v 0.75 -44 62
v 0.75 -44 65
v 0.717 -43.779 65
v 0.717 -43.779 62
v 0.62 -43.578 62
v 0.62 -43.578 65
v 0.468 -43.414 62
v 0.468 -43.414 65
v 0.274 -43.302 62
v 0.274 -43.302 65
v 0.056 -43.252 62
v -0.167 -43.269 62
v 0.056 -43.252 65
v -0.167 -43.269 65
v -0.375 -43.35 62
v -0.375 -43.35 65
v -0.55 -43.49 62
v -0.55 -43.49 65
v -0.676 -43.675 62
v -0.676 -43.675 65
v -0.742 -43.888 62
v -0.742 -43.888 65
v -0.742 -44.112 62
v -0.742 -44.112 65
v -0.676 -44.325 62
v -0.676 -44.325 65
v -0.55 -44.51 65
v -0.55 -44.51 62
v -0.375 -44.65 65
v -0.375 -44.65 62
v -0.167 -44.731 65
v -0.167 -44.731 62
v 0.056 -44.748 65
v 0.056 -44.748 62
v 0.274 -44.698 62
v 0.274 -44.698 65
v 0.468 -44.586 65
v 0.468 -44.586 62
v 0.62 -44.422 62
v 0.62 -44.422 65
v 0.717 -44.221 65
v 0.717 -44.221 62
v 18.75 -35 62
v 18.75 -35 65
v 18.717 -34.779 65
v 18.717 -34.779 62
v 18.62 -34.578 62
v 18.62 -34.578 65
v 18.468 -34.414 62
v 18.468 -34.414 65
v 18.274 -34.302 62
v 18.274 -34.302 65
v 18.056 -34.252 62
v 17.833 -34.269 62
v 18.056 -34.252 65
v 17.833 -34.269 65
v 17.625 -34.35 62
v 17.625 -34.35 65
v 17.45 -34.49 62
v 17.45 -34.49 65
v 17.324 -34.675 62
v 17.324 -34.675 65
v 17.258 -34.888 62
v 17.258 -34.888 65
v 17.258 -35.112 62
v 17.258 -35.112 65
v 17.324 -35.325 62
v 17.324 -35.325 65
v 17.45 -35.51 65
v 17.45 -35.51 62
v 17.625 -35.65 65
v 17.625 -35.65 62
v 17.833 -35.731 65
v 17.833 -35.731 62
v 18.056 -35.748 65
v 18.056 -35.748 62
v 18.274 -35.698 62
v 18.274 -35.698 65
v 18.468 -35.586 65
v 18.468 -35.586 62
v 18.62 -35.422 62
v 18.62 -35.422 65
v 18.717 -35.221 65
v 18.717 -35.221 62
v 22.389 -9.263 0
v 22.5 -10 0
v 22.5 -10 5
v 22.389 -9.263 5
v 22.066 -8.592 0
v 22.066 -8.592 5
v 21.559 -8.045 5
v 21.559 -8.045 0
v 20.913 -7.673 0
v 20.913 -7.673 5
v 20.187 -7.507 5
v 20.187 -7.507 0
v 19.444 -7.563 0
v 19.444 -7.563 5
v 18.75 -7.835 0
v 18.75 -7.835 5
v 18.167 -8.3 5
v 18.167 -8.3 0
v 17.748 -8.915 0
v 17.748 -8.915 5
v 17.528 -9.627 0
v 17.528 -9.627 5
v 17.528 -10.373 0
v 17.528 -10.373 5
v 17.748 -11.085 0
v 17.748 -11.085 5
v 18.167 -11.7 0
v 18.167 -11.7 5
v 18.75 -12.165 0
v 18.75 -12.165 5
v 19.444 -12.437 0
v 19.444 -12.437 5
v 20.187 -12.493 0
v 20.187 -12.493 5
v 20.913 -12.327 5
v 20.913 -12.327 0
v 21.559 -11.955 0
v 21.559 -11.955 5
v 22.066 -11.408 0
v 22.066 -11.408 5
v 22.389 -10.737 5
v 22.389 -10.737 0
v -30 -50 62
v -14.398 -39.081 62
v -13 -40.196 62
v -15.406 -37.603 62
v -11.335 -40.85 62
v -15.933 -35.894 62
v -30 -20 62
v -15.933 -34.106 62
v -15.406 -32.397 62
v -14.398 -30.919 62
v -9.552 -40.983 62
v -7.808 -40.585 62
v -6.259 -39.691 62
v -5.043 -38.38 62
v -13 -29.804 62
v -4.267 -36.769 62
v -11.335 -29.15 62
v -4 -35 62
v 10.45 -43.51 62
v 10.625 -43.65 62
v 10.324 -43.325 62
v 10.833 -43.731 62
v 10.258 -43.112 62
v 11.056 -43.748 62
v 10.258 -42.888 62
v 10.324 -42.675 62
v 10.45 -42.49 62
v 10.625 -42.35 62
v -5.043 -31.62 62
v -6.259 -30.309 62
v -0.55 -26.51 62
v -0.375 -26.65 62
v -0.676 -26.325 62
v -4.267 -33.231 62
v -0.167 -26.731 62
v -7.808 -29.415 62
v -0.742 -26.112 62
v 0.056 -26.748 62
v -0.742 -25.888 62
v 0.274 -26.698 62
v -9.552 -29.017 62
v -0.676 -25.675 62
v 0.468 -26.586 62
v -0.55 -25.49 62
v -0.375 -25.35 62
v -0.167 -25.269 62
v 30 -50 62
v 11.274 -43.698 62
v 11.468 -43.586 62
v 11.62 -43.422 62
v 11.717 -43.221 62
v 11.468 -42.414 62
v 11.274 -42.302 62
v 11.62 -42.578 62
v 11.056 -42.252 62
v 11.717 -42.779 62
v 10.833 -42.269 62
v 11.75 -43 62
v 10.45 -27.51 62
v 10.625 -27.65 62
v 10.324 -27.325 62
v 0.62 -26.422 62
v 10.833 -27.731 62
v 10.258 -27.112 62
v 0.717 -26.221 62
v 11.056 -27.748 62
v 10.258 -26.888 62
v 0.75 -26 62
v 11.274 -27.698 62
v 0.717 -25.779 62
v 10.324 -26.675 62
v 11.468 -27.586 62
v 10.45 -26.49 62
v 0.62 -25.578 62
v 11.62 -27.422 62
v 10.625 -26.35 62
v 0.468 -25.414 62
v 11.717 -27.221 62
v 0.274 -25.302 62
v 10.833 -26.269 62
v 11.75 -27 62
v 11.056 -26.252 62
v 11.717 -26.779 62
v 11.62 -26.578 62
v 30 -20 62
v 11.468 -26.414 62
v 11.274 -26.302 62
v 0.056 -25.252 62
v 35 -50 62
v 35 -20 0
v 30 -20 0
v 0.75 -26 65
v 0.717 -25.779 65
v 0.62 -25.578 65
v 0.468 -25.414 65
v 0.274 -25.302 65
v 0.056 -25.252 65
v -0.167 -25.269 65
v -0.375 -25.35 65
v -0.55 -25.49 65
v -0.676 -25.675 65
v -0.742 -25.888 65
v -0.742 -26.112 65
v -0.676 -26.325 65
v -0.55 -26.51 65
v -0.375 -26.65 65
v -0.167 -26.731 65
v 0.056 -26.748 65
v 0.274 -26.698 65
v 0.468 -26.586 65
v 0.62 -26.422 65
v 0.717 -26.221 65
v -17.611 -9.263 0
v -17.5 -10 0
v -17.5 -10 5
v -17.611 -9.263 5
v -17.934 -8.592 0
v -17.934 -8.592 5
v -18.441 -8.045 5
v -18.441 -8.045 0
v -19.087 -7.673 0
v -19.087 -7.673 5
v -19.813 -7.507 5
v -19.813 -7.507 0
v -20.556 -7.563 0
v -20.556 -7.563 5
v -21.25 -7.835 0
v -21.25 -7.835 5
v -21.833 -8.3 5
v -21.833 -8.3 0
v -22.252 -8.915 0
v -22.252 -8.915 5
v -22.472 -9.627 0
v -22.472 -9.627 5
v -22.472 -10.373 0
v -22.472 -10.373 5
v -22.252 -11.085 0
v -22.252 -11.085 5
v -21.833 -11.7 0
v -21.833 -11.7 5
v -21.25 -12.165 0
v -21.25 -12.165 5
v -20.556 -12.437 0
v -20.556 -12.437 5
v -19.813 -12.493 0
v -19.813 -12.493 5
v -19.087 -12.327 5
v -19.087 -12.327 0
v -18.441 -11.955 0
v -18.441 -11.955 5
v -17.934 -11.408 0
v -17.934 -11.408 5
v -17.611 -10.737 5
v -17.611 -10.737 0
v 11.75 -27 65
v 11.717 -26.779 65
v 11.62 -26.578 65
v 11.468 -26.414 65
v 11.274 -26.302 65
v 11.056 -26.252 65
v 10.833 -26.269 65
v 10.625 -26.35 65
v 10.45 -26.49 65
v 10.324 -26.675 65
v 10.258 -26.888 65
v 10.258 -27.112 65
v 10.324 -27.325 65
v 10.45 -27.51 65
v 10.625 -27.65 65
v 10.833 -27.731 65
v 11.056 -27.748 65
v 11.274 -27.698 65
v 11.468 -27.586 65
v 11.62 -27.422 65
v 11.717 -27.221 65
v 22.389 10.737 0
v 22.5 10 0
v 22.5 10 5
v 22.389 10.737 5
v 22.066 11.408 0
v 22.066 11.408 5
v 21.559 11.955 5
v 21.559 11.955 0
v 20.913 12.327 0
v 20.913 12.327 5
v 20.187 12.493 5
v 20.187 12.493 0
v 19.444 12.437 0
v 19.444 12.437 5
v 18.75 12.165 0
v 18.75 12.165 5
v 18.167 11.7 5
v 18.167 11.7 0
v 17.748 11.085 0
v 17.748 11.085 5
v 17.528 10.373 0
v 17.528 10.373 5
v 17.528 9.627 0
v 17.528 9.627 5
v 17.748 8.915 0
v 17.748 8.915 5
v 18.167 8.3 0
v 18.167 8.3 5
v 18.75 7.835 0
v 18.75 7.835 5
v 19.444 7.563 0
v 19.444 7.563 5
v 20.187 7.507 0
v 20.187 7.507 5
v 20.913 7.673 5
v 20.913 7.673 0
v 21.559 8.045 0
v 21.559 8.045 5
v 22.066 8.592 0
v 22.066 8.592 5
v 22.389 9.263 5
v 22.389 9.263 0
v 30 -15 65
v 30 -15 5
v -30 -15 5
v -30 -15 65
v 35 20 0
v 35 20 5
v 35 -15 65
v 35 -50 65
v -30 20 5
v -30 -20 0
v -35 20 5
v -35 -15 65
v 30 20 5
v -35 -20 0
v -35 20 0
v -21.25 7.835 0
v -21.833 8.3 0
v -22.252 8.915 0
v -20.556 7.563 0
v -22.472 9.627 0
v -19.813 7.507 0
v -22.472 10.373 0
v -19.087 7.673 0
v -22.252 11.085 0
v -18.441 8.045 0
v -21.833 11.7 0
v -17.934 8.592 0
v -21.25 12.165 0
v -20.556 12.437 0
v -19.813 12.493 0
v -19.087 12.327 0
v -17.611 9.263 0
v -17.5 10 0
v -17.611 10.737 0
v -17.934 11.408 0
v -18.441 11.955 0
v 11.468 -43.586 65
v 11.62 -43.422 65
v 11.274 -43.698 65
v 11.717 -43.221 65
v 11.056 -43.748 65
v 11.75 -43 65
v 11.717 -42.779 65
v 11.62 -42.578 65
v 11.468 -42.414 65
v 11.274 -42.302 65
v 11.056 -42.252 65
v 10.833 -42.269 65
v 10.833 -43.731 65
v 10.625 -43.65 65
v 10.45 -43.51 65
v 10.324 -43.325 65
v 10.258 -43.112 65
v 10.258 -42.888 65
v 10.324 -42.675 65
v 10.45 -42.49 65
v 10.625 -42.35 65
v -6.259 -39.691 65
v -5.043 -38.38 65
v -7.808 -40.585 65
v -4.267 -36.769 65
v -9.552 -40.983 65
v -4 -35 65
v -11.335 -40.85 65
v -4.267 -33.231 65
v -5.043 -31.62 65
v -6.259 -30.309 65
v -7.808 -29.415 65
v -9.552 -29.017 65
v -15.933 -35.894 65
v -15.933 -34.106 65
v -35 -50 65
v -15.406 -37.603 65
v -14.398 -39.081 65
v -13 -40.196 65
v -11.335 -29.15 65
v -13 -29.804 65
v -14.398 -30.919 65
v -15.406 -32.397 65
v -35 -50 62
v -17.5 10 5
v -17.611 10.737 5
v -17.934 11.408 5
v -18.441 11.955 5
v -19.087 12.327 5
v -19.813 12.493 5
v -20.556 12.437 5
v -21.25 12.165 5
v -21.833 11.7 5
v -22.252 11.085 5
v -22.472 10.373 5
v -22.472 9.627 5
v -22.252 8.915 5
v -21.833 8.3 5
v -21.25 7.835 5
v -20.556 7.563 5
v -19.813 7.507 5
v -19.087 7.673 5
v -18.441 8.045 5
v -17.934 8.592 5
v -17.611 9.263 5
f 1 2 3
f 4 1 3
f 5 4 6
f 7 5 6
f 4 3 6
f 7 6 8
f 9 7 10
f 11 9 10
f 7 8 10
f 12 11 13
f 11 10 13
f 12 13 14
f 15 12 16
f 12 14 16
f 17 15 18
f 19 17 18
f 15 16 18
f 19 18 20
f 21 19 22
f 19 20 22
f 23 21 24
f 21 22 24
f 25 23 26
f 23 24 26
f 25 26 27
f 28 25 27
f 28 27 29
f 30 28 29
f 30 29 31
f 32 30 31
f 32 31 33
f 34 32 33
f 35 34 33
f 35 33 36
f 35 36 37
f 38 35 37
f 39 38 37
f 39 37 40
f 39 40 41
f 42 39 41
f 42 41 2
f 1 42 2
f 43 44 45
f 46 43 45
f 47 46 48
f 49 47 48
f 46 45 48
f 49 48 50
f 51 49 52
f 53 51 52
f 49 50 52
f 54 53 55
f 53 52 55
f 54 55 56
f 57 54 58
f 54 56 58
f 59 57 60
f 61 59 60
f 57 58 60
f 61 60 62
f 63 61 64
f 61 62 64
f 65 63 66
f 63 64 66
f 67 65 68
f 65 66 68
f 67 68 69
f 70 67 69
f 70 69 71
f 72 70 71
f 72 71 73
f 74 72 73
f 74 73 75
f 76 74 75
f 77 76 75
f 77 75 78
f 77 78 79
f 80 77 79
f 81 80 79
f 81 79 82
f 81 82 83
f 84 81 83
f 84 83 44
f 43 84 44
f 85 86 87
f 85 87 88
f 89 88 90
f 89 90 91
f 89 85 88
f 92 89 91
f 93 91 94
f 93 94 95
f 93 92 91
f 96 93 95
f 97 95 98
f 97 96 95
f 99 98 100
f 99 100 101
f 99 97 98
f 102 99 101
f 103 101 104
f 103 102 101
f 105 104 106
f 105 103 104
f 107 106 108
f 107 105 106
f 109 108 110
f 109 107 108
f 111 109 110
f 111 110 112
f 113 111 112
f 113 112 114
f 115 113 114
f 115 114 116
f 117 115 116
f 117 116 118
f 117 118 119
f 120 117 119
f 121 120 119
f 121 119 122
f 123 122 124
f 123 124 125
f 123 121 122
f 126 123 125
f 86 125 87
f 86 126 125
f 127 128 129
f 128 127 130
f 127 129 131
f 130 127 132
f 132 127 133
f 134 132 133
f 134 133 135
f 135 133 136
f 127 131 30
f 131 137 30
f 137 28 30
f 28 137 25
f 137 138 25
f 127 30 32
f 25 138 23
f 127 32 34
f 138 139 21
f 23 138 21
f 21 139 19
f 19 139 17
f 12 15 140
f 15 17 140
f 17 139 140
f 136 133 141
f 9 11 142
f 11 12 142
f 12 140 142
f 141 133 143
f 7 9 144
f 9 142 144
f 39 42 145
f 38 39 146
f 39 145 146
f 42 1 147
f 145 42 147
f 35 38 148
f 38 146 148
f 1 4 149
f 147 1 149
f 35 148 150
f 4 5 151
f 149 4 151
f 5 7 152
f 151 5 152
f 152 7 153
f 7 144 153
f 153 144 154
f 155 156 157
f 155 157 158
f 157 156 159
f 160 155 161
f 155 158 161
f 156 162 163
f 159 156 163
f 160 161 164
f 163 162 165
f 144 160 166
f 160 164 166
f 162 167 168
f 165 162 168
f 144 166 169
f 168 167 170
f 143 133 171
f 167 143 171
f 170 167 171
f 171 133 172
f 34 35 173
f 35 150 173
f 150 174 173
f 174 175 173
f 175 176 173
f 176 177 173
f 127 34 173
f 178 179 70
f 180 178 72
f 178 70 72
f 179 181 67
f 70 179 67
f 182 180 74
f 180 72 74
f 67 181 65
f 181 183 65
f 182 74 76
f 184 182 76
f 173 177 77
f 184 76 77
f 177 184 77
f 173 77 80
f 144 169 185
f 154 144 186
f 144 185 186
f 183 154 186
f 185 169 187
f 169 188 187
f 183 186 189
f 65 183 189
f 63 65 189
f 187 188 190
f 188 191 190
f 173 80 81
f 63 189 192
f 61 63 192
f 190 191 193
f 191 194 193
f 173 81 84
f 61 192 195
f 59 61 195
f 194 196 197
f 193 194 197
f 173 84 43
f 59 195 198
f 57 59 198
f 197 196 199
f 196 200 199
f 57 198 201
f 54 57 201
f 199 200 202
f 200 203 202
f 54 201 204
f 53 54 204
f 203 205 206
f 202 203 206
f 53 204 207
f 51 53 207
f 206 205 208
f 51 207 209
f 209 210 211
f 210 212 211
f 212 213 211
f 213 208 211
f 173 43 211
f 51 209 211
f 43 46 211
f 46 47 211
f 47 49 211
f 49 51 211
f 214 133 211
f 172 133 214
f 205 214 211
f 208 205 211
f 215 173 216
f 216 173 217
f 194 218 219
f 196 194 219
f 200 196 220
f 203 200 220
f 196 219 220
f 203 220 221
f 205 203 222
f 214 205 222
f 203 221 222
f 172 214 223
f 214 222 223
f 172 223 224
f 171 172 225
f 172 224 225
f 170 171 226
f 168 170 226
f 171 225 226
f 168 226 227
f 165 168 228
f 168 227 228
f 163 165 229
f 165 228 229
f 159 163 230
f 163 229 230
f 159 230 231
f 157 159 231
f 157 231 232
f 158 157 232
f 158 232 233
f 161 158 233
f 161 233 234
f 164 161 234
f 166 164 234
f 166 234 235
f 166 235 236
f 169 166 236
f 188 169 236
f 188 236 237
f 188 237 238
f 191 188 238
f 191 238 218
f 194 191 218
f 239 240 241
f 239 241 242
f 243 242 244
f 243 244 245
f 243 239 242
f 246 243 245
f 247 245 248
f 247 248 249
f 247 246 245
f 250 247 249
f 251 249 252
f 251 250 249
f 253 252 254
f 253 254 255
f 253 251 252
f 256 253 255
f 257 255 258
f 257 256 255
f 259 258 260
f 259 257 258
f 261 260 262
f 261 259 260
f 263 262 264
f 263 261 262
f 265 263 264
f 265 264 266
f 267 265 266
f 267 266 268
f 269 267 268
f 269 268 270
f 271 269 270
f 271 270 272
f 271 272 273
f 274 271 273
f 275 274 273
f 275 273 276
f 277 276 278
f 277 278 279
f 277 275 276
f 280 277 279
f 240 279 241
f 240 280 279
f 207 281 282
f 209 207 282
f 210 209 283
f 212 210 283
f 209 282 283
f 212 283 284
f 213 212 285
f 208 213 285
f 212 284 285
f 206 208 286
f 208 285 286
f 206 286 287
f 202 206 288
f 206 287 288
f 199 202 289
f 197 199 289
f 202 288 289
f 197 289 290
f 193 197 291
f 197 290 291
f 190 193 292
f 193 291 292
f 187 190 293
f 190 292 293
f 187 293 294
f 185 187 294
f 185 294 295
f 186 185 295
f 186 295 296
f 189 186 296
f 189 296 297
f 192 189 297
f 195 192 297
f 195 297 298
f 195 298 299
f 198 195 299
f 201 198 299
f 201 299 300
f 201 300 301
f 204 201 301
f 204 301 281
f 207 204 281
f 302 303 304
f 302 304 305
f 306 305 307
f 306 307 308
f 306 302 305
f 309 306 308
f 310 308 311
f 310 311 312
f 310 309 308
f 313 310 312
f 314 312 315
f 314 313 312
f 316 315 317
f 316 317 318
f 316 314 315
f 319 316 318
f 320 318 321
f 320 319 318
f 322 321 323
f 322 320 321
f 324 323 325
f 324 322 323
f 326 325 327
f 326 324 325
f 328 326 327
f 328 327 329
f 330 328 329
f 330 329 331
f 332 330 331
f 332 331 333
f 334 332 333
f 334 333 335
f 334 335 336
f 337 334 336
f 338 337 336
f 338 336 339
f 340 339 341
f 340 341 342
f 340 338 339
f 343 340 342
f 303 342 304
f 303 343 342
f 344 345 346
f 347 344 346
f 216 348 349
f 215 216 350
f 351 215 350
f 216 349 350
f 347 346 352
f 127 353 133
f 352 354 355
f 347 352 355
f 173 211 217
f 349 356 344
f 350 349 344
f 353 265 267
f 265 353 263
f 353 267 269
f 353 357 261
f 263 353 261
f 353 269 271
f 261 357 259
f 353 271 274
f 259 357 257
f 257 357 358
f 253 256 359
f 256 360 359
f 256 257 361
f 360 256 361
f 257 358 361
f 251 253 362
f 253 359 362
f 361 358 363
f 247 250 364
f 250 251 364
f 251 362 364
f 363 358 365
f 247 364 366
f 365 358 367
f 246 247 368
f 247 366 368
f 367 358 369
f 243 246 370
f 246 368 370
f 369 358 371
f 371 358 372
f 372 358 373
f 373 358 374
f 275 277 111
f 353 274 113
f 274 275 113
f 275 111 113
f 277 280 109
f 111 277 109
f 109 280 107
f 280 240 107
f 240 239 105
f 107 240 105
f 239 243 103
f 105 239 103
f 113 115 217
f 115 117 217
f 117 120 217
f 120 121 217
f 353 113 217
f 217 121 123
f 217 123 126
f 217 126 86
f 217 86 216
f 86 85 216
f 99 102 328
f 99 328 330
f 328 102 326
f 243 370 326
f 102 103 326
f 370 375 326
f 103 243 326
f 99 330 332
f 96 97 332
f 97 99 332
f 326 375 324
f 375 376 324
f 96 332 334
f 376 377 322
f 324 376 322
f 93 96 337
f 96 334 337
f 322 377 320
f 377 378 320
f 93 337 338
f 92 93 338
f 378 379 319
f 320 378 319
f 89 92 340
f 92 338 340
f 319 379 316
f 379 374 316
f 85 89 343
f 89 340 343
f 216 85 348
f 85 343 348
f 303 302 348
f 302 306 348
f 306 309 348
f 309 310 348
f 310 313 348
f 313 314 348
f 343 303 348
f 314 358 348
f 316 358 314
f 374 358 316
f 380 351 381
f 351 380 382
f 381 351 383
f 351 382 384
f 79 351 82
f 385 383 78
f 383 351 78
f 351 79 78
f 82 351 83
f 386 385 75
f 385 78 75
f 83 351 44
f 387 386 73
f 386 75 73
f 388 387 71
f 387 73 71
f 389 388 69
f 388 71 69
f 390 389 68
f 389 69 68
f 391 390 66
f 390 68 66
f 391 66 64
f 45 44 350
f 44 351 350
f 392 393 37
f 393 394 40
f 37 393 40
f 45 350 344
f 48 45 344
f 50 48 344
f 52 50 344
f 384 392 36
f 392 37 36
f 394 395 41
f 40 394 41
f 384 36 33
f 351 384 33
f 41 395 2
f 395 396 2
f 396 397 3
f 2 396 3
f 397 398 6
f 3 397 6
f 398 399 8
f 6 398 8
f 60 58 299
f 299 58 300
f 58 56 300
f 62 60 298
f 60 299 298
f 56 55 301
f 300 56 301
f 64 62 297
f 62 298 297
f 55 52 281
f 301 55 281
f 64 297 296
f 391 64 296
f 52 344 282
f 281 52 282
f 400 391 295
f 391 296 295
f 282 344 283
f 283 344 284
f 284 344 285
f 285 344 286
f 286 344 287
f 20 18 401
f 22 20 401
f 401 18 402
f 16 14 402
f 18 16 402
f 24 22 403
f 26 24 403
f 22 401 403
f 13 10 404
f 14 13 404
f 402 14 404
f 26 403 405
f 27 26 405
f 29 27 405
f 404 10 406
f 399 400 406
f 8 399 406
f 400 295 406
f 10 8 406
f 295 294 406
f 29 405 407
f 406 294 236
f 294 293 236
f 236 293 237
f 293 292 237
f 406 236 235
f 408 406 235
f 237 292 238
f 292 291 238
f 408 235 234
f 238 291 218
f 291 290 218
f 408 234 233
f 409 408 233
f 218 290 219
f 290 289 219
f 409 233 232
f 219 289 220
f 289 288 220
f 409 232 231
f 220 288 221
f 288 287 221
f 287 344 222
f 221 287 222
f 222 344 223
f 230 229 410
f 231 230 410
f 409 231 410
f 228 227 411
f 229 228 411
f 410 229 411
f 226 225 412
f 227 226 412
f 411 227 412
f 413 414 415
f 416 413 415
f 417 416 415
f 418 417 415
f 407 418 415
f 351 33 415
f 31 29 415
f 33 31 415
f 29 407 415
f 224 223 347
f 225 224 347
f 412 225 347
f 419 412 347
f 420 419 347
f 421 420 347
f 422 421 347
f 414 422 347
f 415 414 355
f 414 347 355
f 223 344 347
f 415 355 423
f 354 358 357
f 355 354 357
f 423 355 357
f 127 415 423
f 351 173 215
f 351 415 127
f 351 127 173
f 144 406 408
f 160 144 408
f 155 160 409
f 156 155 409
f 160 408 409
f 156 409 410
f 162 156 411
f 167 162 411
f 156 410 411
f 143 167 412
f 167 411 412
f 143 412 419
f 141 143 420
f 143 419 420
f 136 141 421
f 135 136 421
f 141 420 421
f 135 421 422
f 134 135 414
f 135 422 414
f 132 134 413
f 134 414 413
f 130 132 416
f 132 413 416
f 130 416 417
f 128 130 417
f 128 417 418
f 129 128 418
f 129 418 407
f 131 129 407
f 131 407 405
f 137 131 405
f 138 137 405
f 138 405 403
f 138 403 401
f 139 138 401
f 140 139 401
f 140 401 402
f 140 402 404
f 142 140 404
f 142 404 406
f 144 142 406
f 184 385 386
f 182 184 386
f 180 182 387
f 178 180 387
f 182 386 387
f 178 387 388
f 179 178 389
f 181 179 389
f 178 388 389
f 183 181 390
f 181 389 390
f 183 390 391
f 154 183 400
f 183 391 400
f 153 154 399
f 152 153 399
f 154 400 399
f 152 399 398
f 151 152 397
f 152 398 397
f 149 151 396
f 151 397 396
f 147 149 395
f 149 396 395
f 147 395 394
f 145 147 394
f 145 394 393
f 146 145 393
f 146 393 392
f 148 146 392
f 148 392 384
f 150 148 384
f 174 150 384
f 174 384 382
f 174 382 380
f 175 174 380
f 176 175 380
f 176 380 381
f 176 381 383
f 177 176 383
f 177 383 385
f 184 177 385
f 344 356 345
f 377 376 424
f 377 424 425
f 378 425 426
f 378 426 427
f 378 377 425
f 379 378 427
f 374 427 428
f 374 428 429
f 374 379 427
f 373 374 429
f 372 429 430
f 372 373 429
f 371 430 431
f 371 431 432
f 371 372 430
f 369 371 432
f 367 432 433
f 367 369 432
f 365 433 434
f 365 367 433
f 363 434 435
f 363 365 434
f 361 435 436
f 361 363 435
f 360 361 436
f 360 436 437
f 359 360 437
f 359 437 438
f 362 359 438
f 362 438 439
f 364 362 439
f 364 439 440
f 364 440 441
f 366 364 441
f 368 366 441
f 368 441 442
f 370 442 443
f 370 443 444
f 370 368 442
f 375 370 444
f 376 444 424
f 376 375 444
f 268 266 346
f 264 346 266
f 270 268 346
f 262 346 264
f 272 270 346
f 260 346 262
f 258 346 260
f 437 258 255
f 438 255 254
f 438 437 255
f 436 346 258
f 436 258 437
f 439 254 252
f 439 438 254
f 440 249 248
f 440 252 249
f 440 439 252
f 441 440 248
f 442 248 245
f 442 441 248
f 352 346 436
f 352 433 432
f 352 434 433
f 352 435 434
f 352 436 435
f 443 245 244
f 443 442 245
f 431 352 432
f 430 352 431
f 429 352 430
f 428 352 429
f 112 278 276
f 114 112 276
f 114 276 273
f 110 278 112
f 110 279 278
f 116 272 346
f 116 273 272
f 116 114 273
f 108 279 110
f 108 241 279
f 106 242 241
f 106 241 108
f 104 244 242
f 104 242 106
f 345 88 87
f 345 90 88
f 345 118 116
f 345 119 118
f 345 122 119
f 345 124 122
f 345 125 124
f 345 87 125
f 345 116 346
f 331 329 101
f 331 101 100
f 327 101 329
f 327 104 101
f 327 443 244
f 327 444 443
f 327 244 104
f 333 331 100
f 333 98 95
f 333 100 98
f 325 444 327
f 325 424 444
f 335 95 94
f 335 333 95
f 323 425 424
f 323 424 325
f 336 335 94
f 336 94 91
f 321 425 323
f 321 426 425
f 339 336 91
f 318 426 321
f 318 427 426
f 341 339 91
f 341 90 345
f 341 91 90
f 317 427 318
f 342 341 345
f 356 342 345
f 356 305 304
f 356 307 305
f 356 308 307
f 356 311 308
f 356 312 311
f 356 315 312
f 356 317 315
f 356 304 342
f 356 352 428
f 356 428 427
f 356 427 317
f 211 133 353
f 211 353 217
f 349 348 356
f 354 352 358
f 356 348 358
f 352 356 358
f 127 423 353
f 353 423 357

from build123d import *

# Parameters (mm, degrees)
SKETCH_1_W          = 70
SKETCH_1_H          = 40
SKETCH_1_R          = 2.5
EXTRUDE_1_DEPTH     = 5
EXTRUDE_2_DEPTH     = 60
CUT_EXTRUDE_1_DEPTH = 100
EXTRUDE_3_DEPTH     = 30
CUT_EXTRUDE_2_DEPTH = 70
SKETCH_8_R          = 6
SKETCH_8_R_2        = 0.75
CUT_EXTRUDE_3_DEPTH = 5


with BuildPart() as part:
    # 草图1 → 凸台-拉伸1 (new body)
    with BuildSketch(Plane.XY):
        Rectangle(SKETCH_1_W, SKETCH_1_H)
        with Locations((-20, 10)):
            Circle(SKETCH_1_R, mode=Mode.SUBTRACT)
        with Locations((20, 10)):
            Circle(SKETCH_1_R, mode=Mode.SUBTRACT)
        with Locations((-20, -10)):
            Circle(SKETCH_1_R, mode=Mode.SUBTRACT)
        with Locations((20, -10)):
            Circle(SKETCH_1_R, mode=Mode.SUBTRACT)
    extrude(amount=EXTRUDE_1_DEPTH)

    # 草图3 → 凸台-拉伸2 (add)
    with BuildSketch(Plane.XY.offset(5)):
        Polygon((-35, -20), (35, -20), (35, 20), (30, 20), (30, -15), (-30, -15), (-30, 20), (-35, 20), align=None)
    extrude(amount=EXTRUDE_2_DEPTH)

    # 草图4 → 切除-拉伸1 (cut)
    with BuildSketch(Plane.ZY.offset(35)):
        Polygon((5, 20), (65, -15), (65, 20), align=None)
    extrude(amount=-CUT_EXTRUDE_1_DEPTH, mode=Mode.SUBTRACT)

    # 草图5 → 凸台-拉伸3 (add)
    with BuildSketch(Plane.XZ.offset(20)):
        Polygon((30, 0), (35, 0), (35, 65), (-35, 65), (-35, 0), (-30, 0), (-30, 62), (30, 62), align=None)
    extrude(amount=EXTRUDE_3_DEPTH)

    # 草图6 → 切除-拉伸2 (cut)
    with BuildSketch(Plane.ZY.offset(35)):
        Polygon((62, -50), (0, -20), (0, -50), align=None)
    extrude(amount=-CUT_EXTRUDE_2_DEPTH, mode=Mode.SUBTRACT)

    # 草图8 → 切除-拉伸3 (cut)
    with BuildSketch(Plane.XY.offset(65)):
        with Locations((-10, -35)):
            Circle(SKETCH_8_R)
        with Locations((18, -35)):
            Circle(SKETCH_8_R_2)
        with Locations((11, -43)):
            Circle(SKETCH_8_R_2)
        with Locations((0, -44)):
            Circle(SKETCH_8_R_2)
        with Locations((11, -27)):
            Circle(SKETCH_8_R_2)
        with Locations((0, -26)):
            Circle(SKETCH_8_R_2)
    extrude(amount=-CUT_EXTRUDE_3_DEPTH, mode=Mode.SUBTRACT)


solid = part.part
